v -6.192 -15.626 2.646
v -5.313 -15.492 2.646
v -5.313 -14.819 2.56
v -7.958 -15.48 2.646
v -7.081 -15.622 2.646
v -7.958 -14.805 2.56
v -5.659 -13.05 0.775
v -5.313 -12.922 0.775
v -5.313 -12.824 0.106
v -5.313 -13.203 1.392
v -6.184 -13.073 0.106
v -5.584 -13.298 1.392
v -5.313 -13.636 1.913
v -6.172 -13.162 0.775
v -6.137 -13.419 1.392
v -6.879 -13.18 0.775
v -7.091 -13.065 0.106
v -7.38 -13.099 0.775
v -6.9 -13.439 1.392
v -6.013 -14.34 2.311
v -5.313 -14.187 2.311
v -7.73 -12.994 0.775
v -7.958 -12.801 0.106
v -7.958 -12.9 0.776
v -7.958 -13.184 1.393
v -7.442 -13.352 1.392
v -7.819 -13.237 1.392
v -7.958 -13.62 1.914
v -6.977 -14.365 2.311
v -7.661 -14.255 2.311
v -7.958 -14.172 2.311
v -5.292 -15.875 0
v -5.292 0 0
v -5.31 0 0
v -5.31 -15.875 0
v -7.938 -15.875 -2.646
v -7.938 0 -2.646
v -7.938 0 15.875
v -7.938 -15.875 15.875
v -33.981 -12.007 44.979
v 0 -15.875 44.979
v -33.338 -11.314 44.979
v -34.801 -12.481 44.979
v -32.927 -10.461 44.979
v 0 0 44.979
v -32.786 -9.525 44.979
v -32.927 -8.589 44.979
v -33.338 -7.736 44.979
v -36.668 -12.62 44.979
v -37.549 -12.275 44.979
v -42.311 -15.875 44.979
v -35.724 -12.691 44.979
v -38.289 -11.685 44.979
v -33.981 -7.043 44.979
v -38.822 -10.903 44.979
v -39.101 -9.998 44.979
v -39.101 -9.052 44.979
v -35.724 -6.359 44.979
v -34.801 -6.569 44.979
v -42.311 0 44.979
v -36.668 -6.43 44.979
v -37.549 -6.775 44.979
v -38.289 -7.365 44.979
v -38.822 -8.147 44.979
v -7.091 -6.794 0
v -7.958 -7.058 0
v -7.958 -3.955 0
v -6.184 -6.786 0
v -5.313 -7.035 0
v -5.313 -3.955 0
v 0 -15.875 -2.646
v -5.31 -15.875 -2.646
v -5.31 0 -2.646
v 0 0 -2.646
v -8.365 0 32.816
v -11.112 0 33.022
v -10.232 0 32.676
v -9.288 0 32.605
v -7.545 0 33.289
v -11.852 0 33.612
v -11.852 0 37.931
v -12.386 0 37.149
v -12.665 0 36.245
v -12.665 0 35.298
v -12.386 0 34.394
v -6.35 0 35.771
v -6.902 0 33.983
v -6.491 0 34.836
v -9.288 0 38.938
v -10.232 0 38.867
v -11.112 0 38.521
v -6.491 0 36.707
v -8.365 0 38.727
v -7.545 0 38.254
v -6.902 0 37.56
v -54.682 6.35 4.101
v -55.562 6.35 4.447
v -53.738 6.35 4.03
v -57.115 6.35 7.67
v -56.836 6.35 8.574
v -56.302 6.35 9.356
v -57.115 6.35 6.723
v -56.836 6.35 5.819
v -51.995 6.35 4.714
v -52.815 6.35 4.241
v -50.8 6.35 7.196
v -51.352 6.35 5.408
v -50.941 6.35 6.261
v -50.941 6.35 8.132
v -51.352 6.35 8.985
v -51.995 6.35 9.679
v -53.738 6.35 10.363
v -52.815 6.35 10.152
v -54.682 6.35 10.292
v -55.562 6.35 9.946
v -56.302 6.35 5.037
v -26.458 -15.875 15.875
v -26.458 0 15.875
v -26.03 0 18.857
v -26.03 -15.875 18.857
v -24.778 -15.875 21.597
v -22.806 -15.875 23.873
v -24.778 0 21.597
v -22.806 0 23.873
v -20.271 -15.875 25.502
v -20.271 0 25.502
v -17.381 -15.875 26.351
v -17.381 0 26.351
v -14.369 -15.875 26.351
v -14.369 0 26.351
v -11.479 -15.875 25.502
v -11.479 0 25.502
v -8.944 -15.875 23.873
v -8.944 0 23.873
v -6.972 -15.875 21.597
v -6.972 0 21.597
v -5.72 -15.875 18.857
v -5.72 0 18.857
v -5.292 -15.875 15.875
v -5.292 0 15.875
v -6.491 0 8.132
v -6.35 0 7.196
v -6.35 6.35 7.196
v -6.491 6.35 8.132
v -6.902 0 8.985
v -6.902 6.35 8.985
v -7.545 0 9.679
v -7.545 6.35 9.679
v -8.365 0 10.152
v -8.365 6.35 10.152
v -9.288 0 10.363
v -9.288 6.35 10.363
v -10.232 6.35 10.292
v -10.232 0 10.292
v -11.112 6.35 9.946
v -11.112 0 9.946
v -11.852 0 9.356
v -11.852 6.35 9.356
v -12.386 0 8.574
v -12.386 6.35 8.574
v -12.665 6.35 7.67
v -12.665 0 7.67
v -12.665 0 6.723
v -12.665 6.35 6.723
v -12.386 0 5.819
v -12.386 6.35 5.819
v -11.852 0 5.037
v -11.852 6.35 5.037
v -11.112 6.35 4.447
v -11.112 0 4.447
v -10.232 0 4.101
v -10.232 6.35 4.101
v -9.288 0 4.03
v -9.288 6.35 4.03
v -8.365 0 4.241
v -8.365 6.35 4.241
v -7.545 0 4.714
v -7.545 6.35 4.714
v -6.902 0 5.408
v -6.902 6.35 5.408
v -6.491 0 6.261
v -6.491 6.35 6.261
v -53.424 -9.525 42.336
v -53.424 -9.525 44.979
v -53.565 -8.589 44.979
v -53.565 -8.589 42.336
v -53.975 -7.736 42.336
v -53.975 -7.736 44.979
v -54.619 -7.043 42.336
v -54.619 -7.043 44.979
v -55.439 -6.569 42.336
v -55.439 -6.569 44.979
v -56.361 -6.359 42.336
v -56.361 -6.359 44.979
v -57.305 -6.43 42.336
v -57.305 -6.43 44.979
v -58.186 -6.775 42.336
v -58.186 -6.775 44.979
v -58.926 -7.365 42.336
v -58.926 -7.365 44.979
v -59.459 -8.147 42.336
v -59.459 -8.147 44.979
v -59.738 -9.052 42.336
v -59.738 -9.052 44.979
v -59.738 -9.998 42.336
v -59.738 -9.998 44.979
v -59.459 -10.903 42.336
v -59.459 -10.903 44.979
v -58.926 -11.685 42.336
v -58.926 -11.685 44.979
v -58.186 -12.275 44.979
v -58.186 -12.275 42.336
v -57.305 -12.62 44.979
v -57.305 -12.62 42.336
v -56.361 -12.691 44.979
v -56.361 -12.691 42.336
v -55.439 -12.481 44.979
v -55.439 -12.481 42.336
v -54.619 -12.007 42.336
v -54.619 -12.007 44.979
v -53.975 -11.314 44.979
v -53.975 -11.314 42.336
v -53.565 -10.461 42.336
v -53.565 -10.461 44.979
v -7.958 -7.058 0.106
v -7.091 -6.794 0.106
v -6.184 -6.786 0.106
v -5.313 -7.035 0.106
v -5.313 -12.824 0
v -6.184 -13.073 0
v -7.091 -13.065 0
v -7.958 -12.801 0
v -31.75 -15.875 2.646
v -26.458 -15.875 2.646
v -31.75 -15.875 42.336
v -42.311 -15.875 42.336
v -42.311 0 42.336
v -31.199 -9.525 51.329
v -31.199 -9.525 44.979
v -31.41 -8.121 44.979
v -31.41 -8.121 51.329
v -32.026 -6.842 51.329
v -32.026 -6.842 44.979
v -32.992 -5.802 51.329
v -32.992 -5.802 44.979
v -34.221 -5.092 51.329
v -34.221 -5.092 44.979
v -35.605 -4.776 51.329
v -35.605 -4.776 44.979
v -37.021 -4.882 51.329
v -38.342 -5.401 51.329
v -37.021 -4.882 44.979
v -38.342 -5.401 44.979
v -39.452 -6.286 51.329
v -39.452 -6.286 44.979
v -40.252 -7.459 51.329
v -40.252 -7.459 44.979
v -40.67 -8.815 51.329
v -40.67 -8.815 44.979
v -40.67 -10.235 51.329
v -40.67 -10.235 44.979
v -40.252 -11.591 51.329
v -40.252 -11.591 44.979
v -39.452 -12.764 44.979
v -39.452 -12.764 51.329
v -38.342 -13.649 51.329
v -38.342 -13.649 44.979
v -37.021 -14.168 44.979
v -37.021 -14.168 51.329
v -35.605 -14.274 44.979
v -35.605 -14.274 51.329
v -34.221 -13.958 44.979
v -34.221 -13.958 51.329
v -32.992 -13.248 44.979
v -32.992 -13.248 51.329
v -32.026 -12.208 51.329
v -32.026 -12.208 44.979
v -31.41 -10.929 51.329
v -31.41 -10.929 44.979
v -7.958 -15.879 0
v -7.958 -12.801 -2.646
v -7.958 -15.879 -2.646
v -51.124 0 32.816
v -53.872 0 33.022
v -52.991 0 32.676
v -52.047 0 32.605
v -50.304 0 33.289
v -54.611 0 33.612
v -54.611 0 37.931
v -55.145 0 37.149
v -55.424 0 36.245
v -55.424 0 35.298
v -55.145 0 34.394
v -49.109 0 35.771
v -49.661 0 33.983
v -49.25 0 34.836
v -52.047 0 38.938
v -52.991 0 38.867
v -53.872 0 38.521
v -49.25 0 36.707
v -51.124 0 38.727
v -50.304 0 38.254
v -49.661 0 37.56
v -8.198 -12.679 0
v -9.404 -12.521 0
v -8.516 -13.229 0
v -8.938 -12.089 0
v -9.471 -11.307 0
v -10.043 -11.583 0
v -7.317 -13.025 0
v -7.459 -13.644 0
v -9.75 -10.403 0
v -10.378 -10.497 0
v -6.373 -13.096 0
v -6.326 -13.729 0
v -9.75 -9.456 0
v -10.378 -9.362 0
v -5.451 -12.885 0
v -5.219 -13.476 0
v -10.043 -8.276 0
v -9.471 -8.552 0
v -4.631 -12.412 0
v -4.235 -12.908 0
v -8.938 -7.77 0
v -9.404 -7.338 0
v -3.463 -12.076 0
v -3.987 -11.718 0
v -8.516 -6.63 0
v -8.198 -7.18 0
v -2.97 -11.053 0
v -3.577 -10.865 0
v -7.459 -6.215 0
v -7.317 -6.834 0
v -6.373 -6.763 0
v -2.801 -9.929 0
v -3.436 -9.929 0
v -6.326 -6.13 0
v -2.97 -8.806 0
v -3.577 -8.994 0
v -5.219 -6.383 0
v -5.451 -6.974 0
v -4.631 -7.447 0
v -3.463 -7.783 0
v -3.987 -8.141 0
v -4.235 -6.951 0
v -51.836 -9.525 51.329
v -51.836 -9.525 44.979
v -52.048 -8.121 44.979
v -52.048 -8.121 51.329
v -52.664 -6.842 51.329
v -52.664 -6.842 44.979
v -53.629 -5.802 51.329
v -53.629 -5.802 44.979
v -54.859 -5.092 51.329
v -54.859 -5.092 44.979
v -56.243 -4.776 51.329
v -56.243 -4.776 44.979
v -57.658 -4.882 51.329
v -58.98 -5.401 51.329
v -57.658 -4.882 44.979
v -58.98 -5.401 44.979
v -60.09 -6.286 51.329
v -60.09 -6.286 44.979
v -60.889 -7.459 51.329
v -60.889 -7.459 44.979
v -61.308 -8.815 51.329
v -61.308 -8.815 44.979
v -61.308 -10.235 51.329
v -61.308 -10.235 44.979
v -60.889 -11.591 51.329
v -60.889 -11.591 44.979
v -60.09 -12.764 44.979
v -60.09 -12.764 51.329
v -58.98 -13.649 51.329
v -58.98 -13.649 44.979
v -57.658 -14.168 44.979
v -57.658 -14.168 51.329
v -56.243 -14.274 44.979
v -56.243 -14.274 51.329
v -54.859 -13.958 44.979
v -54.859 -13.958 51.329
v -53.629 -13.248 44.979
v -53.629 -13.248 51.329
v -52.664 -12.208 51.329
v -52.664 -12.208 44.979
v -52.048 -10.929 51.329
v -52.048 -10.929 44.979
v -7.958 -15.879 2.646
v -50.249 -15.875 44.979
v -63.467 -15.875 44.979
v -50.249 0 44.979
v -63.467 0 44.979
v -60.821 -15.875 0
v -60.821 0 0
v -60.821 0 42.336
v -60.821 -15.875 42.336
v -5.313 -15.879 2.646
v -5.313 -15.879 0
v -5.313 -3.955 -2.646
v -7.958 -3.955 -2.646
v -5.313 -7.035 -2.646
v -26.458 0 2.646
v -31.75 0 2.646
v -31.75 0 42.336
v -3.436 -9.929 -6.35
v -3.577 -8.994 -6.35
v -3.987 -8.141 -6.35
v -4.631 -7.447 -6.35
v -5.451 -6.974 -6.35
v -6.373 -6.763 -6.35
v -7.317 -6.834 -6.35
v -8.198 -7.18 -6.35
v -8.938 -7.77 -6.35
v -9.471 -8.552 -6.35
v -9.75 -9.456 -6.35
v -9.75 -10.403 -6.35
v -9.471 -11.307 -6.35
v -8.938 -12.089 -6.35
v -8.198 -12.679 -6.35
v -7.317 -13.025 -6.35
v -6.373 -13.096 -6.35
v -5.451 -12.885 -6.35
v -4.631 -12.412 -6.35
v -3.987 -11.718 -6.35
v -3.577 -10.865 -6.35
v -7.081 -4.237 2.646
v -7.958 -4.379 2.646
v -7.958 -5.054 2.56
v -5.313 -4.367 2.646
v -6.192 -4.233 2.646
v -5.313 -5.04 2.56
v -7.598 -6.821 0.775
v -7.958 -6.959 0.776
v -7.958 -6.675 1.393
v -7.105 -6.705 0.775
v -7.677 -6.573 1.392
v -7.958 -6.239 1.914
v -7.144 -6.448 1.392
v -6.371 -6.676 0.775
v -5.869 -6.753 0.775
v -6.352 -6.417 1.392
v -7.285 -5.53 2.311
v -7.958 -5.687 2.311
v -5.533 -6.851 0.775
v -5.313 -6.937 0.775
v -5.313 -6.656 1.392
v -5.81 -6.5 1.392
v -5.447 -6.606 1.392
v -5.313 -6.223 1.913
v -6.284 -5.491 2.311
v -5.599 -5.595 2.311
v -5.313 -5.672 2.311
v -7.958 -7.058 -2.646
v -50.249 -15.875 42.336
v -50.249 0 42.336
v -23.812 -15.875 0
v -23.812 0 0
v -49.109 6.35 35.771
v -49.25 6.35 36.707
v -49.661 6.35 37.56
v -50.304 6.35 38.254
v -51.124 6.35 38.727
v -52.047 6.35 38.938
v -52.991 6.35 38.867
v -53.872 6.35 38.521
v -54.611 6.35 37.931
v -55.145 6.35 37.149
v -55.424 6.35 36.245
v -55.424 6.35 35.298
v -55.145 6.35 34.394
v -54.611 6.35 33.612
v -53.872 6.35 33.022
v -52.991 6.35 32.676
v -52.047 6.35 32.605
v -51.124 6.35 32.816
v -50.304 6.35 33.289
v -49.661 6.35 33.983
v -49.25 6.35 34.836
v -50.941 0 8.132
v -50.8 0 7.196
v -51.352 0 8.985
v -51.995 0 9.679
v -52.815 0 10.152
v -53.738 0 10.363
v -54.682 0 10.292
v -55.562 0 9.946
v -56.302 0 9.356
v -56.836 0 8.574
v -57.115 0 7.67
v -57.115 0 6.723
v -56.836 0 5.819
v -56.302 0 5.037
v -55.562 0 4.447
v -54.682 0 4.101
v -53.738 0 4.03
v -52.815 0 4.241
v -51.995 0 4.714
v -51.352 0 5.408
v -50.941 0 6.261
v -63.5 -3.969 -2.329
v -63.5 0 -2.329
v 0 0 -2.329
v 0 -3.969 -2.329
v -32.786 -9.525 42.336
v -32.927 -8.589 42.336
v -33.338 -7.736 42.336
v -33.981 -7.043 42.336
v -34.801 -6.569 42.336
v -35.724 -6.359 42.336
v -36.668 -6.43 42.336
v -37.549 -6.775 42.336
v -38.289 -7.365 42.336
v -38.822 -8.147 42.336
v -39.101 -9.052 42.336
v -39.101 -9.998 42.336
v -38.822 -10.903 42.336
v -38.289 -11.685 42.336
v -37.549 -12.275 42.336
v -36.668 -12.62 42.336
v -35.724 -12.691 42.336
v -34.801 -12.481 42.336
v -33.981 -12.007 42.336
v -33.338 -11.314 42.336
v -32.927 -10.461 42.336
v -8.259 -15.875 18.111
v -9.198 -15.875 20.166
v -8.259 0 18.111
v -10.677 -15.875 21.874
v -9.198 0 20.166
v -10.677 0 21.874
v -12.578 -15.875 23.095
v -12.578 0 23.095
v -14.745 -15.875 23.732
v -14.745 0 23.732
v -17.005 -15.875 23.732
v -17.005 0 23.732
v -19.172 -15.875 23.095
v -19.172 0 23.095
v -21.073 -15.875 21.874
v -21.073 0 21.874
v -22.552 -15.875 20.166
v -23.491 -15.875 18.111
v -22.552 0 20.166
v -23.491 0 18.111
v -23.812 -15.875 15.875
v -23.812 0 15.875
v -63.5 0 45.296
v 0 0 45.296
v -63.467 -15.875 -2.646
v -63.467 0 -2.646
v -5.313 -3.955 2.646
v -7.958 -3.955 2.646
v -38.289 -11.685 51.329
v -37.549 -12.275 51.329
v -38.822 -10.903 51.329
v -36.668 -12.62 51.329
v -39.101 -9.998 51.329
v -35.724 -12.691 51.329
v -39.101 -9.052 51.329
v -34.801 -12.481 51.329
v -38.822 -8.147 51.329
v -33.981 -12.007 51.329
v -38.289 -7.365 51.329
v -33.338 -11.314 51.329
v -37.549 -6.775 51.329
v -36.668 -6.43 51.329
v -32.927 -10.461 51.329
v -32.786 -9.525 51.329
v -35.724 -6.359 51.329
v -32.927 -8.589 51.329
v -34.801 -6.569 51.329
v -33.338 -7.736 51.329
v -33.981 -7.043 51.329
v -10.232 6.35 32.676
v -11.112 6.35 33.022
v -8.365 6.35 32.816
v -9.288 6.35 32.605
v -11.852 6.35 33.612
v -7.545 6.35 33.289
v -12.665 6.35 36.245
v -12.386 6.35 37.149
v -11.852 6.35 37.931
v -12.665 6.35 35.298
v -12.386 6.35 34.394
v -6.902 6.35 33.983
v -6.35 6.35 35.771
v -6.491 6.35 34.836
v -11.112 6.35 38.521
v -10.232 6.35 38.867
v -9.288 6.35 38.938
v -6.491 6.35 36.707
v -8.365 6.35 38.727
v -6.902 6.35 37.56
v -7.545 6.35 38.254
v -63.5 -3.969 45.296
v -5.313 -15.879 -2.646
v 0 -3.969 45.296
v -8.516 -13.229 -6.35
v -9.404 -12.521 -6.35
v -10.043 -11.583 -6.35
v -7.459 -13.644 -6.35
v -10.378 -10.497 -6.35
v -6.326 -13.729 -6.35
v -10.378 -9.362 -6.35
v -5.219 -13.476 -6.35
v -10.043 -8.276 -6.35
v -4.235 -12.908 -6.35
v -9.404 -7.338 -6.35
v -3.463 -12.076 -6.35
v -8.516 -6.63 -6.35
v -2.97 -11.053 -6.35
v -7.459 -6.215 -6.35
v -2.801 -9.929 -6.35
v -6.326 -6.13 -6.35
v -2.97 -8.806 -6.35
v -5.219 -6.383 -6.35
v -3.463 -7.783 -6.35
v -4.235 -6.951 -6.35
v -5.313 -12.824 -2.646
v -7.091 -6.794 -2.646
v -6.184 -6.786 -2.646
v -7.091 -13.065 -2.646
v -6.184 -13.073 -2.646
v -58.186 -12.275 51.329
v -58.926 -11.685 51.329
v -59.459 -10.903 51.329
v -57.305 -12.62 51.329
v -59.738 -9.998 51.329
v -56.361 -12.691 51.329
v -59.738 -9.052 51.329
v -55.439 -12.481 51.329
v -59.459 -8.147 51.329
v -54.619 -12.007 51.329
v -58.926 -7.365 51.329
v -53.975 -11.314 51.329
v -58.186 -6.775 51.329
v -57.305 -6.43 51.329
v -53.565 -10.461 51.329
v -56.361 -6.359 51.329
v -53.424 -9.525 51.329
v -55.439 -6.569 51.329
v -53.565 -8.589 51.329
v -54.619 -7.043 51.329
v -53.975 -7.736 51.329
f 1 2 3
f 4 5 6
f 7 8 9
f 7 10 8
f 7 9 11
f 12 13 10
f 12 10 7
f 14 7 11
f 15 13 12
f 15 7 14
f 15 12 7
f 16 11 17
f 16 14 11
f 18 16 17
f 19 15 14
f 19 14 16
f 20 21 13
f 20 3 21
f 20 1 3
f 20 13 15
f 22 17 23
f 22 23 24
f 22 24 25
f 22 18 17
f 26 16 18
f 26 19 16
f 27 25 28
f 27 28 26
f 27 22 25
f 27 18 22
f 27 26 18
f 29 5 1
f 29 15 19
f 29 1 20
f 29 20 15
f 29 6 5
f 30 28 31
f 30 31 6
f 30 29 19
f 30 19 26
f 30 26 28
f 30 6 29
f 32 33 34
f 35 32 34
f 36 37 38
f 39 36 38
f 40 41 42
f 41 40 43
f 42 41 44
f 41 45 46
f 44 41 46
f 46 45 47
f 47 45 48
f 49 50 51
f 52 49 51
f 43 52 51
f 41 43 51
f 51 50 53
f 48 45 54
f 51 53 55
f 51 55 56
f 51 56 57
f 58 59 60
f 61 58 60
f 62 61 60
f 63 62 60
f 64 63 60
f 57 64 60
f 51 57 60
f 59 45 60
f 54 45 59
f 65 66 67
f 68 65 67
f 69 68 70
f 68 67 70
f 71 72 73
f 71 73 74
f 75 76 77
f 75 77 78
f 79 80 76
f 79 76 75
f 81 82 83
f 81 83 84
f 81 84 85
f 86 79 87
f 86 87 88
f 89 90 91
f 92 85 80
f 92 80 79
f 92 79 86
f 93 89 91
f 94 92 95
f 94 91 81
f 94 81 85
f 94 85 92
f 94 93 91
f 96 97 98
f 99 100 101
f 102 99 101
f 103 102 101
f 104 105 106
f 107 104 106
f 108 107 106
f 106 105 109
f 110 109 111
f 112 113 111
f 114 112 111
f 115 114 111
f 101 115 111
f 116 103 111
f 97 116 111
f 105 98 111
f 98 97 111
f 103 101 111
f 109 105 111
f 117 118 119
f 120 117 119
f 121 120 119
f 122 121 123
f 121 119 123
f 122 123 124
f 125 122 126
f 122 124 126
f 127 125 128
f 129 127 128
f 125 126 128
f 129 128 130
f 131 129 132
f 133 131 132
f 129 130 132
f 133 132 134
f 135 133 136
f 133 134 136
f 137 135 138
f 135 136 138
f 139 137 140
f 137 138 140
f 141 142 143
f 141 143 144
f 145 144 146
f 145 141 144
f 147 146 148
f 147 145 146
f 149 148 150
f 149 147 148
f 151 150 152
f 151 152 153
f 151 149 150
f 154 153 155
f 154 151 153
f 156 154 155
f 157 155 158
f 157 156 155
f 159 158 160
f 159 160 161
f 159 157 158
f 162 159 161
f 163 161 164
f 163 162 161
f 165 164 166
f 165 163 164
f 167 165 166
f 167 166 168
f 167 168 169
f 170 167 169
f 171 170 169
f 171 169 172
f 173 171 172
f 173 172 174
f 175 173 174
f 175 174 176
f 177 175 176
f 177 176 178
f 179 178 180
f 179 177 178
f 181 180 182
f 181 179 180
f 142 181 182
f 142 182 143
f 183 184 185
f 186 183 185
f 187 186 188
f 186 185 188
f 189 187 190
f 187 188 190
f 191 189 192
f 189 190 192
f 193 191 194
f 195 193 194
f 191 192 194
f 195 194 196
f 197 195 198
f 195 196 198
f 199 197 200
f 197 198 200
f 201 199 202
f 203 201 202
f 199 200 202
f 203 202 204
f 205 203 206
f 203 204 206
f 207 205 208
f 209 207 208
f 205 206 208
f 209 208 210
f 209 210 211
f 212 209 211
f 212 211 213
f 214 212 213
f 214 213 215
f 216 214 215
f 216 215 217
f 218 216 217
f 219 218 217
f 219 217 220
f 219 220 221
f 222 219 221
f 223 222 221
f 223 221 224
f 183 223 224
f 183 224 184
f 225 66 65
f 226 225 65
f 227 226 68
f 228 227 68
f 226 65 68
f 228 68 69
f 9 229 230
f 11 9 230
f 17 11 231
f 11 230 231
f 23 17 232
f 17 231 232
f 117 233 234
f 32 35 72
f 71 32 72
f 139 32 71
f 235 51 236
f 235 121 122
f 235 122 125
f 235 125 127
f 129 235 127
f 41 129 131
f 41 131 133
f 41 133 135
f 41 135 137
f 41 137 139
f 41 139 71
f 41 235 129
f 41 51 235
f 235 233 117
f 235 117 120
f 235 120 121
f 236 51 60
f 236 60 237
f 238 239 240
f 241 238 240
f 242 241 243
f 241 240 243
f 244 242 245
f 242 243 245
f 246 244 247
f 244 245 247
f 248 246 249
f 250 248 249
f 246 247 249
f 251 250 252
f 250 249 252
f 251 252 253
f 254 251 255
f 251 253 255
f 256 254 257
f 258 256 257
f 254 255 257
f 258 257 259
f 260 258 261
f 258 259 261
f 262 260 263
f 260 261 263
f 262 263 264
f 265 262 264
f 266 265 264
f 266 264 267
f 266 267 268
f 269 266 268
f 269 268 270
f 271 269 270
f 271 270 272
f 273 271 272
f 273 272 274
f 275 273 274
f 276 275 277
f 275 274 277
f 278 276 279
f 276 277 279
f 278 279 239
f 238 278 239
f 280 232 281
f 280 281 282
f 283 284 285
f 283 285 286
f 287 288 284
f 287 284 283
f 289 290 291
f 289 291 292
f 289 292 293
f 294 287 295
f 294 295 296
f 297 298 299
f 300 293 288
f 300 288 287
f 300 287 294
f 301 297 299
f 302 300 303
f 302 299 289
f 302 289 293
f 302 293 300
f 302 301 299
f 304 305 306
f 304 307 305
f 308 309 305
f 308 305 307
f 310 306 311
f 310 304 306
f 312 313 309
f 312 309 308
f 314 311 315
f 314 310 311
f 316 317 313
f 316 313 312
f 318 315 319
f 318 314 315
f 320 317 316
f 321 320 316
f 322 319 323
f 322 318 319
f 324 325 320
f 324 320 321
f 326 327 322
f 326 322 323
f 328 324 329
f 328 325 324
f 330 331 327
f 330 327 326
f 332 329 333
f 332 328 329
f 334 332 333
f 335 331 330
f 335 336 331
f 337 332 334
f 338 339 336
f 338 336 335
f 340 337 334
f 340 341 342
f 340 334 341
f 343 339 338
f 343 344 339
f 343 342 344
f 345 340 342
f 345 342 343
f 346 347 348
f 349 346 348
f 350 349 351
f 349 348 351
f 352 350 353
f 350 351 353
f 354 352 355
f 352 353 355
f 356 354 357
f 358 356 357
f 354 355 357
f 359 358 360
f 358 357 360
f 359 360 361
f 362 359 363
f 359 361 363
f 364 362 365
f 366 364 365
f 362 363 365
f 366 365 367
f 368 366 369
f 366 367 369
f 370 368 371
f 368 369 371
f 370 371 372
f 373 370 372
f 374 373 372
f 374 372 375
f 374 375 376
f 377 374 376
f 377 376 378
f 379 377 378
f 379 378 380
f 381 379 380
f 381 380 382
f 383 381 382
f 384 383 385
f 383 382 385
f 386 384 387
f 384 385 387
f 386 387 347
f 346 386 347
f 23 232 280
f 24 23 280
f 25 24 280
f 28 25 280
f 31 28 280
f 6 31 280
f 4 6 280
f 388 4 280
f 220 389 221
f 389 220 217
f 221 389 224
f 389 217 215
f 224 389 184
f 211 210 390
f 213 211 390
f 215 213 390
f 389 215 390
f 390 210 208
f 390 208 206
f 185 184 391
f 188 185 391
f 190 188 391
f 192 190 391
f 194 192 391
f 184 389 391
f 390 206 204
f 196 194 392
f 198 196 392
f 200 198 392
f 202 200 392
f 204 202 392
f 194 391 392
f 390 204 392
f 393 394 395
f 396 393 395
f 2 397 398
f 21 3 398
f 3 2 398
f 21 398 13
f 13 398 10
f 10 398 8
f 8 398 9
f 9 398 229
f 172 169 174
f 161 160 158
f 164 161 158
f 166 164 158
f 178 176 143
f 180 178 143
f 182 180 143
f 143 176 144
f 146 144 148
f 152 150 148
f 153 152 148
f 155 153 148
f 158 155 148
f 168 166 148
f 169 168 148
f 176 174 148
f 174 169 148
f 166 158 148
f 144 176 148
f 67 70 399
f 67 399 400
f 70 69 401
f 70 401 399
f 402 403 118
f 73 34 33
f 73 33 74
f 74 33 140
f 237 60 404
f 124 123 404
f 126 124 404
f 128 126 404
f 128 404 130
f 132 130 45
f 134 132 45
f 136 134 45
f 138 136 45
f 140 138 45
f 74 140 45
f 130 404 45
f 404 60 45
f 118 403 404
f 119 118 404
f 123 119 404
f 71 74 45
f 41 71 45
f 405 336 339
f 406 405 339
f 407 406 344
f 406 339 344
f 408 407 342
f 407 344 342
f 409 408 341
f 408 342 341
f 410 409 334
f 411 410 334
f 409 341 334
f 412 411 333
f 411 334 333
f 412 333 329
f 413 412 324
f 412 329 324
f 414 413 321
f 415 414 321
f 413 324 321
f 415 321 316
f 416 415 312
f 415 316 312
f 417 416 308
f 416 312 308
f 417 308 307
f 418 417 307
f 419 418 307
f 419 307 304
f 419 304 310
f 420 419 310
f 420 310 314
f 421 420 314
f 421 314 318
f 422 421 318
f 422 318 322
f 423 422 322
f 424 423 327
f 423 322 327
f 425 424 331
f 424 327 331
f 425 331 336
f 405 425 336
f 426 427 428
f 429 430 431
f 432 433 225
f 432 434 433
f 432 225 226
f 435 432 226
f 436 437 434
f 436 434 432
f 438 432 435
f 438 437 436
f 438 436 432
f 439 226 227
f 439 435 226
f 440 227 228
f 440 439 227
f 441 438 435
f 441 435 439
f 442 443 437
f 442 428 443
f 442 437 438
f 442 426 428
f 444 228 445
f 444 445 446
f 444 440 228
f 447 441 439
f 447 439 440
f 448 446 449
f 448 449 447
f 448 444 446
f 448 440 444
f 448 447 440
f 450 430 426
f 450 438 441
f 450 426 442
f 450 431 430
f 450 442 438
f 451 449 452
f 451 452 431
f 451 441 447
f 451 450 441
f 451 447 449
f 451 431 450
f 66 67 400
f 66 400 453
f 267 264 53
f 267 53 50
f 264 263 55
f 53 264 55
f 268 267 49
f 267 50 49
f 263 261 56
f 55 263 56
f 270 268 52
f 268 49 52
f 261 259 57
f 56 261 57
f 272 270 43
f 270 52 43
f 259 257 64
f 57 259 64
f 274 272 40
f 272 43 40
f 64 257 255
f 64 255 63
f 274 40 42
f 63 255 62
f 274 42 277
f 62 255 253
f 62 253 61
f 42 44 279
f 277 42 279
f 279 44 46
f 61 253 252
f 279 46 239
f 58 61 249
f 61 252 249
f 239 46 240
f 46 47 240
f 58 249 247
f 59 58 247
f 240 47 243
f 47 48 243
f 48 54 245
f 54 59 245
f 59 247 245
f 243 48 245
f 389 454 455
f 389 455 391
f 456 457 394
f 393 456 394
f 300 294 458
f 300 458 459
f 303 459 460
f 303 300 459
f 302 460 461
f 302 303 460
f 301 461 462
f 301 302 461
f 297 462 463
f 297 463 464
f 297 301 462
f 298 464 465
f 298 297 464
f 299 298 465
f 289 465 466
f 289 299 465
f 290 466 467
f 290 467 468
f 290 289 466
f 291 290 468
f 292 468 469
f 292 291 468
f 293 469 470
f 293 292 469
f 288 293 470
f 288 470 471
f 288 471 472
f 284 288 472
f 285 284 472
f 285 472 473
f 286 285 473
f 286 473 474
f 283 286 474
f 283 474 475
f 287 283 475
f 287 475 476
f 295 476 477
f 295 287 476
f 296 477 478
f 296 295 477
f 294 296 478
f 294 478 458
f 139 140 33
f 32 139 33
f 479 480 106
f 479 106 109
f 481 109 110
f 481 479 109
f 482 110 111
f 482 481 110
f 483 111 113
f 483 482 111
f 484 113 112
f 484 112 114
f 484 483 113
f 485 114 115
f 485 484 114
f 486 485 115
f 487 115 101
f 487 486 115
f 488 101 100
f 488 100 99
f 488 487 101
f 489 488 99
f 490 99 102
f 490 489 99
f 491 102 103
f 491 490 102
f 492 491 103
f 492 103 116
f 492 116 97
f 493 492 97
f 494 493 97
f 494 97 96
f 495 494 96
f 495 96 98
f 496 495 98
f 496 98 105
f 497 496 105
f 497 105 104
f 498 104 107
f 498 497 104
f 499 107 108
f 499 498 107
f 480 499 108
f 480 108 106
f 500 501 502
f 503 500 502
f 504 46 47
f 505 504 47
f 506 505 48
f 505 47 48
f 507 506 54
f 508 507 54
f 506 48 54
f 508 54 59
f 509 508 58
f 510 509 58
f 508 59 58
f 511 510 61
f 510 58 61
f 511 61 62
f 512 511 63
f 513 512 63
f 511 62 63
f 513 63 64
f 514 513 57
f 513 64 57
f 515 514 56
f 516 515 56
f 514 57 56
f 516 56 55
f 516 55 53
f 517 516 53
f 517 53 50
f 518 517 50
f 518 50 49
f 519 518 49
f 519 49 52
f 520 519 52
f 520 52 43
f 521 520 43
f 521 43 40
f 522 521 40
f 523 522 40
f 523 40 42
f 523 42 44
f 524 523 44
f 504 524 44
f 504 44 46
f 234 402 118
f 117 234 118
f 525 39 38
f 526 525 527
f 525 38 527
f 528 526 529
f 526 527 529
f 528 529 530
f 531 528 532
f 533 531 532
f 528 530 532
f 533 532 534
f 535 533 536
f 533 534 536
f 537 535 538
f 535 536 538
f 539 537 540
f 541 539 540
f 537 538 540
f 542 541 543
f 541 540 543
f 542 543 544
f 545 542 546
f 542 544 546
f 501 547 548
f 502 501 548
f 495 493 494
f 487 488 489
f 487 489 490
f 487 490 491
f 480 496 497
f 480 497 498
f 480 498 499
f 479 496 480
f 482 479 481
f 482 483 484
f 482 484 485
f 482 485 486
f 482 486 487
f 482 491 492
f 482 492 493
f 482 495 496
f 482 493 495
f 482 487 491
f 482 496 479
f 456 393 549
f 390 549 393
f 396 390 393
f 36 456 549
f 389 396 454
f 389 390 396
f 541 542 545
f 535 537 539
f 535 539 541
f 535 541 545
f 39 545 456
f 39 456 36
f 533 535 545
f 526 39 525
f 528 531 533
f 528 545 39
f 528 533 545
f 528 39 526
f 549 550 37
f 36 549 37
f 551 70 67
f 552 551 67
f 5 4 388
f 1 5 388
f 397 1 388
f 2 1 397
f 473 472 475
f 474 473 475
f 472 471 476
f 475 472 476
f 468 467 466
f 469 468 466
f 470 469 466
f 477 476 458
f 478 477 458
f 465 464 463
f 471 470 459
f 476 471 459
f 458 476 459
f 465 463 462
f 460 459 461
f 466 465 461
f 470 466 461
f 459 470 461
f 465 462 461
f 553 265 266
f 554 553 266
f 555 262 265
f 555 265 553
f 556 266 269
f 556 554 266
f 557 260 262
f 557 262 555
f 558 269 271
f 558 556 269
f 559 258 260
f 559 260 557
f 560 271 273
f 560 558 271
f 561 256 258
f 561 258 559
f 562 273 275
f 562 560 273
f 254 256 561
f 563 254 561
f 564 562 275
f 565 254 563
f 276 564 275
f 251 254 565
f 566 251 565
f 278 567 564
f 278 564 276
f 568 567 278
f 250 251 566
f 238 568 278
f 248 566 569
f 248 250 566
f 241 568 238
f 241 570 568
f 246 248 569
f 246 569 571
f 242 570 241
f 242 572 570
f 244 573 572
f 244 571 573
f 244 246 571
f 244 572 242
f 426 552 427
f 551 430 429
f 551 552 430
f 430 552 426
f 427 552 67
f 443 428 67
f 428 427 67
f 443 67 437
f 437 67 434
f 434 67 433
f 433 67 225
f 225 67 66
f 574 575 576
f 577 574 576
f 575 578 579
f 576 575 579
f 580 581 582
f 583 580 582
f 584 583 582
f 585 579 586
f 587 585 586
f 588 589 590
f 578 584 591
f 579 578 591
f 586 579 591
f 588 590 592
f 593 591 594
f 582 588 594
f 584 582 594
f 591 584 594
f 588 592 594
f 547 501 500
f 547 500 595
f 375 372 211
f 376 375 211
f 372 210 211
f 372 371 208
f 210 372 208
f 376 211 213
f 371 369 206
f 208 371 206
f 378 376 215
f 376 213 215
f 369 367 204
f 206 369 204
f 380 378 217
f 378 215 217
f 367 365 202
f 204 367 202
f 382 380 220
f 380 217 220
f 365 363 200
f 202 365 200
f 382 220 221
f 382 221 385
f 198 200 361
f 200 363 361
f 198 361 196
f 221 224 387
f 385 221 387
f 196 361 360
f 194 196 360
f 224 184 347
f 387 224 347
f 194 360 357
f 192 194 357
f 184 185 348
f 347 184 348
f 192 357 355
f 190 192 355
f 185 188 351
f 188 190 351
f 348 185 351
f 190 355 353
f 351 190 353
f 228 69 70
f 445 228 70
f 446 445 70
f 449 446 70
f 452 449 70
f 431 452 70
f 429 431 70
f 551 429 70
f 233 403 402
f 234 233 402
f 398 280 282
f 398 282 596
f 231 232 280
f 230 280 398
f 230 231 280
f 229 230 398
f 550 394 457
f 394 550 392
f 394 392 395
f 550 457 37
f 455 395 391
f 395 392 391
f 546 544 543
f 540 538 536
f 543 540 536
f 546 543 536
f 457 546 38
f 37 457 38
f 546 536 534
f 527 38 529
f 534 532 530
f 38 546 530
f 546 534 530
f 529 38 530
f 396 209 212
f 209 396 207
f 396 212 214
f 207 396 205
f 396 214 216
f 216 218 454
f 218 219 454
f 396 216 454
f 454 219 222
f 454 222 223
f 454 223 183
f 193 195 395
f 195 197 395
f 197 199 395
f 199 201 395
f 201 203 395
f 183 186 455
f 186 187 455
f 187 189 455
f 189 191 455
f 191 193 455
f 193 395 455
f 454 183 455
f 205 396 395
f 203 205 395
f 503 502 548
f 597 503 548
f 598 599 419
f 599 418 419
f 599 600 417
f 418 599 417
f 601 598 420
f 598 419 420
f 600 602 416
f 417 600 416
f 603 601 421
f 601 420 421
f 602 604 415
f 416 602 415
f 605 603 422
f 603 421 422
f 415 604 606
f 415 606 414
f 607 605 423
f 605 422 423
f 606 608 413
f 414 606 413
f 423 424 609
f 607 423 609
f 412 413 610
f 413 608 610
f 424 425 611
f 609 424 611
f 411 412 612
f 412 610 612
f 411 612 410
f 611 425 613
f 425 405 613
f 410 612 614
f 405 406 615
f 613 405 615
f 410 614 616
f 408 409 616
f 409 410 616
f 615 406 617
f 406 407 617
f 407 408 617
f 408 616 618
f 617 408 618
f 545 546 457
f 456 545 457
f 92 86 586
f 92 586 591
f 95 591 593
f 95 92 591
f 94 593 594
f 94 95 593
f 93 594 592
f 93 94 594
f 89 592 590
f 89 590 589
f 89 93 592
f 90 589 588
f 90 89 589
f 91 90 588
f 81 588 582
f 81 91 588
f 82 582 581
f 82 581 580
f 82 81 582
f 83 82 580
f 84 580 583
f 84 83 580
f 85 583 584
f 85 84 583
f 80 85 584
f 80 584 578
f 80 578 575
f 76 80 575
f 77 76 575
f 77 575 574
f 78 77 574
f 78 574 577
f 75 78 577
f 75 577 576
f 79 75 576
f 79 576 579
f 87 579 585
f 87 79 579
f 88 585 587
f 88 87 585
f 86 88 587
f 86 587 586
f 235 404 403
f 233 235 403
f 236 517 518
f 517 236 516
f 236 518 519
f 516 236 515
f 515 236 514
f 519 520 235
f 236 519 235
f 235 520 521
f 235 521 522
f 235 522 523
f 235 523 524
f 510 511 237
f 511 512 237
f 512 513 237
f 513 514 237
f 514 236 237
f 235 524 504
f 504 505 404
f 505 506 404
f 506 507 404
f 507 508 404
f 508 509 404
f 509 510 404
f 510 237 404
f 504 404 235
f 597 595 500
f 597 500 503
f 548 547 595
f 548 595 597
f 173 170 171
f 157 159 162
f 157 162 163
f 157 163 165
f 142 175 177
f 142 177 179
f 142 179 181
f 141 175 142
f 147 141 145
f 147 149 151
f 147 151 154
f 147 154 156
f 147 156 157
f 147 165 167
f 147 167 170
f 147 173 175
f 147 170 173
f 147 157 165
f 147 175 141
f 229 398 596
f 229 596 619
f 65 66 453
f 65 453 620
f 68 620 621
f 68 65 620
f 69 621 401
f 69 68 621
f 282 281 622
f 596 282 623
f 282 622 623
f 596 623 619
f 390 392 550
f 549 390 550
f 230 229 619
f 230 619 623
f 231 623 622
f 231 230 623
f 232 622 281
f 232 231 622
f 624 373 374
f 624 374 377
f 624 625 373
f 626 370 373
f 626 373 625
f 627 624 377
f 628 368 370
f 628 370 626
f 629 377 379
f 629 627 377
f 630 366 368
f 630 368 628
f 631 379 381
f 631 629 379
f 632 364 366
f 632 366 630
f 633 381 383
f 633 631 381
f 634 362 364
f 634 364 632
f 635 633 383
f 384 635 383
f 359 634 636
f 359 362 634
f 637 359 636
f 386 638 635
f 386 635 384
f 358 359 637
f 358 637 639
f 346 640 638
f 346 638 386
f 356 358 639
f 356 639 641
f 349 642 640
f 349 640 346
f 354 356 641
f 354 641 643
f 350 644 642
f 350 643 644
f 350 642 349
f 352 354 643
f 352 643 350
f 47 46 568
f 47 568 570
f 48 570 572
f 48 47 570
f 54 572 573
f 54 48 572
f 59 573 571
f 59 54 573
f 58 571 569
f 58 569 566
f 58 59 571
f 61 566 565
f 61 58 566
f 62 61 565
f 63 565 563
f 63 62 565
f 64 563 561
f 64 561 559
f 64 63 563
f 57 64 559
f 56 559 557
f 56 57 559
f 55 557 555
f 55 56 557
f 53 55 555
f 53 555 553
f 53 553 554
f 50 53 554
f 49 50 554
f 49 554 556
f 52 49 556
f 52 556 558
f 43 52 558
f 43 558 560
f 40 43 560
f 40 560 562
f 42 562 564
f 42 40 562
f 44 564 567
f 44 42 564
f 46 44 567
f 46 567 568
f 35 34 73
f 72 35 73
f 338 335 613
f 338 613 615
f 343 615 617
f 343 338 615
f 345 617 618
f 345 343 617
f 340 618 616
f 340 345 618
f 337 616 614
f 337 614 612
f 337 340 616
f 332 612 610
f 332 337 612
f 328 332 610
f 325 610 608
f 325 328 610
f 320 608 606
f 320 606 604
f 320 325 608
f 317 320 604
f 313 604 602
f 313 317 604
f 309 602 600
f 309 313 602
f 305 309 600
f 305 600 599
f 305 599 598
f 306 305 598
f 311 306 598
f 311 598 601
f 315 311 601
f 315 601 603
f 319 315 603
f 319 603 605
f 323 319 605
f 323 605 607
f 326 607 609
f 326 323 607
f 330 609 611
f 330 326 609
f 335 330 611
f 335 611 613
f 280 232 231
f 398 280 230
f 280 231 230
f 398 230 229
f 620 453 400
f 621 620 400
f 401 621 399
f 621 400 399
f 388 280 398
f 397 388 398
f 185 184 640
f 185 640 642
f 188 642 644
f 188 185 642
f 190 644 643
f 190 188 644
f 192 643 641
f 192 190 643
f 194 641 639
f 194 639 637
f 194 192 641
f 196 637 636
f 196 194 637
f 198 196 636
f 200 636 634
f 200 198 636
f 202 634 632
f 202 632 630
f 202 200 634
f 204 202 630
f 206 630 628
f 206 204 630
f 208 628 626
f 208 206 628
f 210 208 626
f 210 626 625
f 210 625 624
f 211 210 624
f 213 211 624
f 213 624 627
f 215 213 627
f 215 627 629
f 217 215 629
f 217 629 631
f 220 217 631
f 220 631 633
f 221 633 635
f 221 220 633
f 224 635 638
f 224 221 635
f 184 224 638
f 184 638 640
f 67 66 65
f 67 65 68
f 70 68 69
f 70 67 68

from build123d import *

# Parameters (mm, degrees)
F1_DEPTH  = 15.875
F0_W      = 2.6458333332
F0_H      = 42.3358732487
F2_W      = 63.5
F2_H      = 47.625
F2_R      = 3.175
F3_DEPTH  = 3.96875
F4_DEPTH  = 6.35
F5_R      = 4.7625
F5_R_2    = 3.175
F6_DEPTH  = 6.35
F7_R      = 3.175
F8_DEPTH  = 25.4
F9_R      = 3.81
F9_R_2    = 3.175
F10_DEPTH = 6.35
F12_DEPTH = 2.645833164
F13_DEPTH = 2.6458333316
F14_R     = 2.54
F14_2_R   = 2.54


# Not quite as in the source:
# - a feature names something its author has since deleted; it is built from what else it names


with BuildPart() as f1:
    # F0 (on Front) → F1 (new body)
    with BuildSketch(Plane.XZ):
        with BuildLine():
            Line((0, 44.979166582), (-31.75, 44.979166582))
            Line((-31.75, 44.979166582), (-31.75, 42.3358732487))
            Line((-31.75, 42.3358732487), (-31.75, 2.6458333332))
            Line((-31.75, 2.6458333332), (-26.4583333333, 2.6458333332))
            Line((-26.4583333333, 2.6458333332), (-26.4583333333, 15.875))
            ThreePointArc((-26.4583333333, 15.875), (-15.875, 26.4583333333), (-5.2916666667, 15.875))
            Line((-5.2916666667, 15.875), (-5.2916666667, 0))
            Line((-5.2916666667, 0), (0, 0))
            Line((0, 0), (0, 44.979166582))
        make_face()
        Polygon((0, -2.6458333333), (0, 0), (-5.2916666667, 0), (-5.309548229, 0), (-5.309548229, -2.6458333333), align=None)
        Polygon((-31.75, 42.3358732487), (-31.75, 44.979166582), (-34.3958333316, 44.979166582), (-37.0416664956, 44.979166582), (-42.3110765377, 44.979166582), (-42.3110765377, 42.3358732487), (-37.0416664956, 42.3358732487), (-34.3958333316, 42.3358732487), align=None)
    extrude(amount=F1_DEPTH)


with BuildPart() as f1b:
    # F0 (on Front) → F1, piece 2 (new body)
    with BuildSketch(Plane.XZ):
        with BuildLine():
            Line((-23.8125, 0), (-7.9375, 0))
            Line((-7.9375, 0), (-7.9375, 15.875))
            ThreePointArc((-7.9375, 15.875), (-15.875, 23.8125), (-23.8125, 15.875))
            Line((-23.8125, 15.875), (-23.8125, 0))
        make_face()
        Polygon((-26.4583333333, 0), (-31.75, 0), (-60.8213265341, 0), (-63.4671598673, 0), (-63.4671598673, -2.6458333333), (-7.9375, -2.6458333333), (-7.9375, 0), (-23.8125, 0), align=None)
        with Locations((-62.1442432007, 21.1679366243)):
            Rectangle(F0_W, F0_H)
        Polygon((-50.2485765377, 42.3358732487), (-50.2485765377, 44.979166582), (-55.5296598693, 44.979166582), (-58.175493201, 44.979166582), (-63.4671598673, 44.979166582), (-63.4671598673, 42.3358732487), (-60.8213265341, 42.3358732487), (-58.175493201, 42.3358732487), (-55.5296598693, 42.3358732487), align=None)
    extrude(amount=F1_DEPTH)


with BuildPart() as f3:
    # F2 (on Front) → F3 (new body)
    with BuildSketch(Plane.XZ):
        with Locations((-31.75, 21.4839725468)):
            Rectangle(F2_W, F2_H)
        with Locations((-53.975, 7.1964725468)):
            Circle(F2_R, mode=Mode.SUBTRACT)
        with Locations((-9.525, 7.1964725468)):
            Circle(F2_R, mode=Mode.SUBTRACT)
        with Locations((-52.284011212, 35.7714725468)):
            Circle(F2_R, mode=Mode.SUBTRACT)
        with Locations((-9.525, 35.7714725468)):
            Circle(F2_R, mode=Mode.SUBTRACT)
        with Locations((-52.284011212, 35.7714725468)):
            Circle(F2_R)
        with Locations((-53.975, 7.1964725468)):
            Circle(F2_R)
        with Locations((-9.525, 7.1964725468)):
            Circle(F2_R)
        with Locations((-9.525, 35.7714725468)):
            Circle(F2_R)
    extrude(amount=F3_DEPTH)


with BuildPart() as f4:
    # F2 (on Front) → F4 (new body)
    with BuildSketch(Plane.XZ):
        with Locations((-9.525, 35.7714725468)):
            Circle(F2_R)
    extrude(amount=-F4_DEPTH)


with BuildPart() as f4b:
    # F2 (on Front) → F4, piece 2 (new body)
    with BuildSketch(Plane.XZ):
        with Locations((-52.284011212, 35.7714725468)):
            Circle(F2_R)
    extrude(amount=-F4_DEPTH)


with BuildPart() as f4c:
    # F2 (on Front) → F4, piece 3 (new body)
    with BuildSketch(Plane.XZ):
        with Locations((-9.525, 7.1964725468)):
            Circle(F2_R)
    extrude(amount=-F4_DEPTH)


with BuildPart() as f4d:
    # F2 (on Front) → F4, piece 4 (new body)
    with BuildSketch(Plane.XZ):
        with Locations((-53.975, 7.1964725468)):
            Circle(F2_R)
    extrude(amount=-F4_DEPTH)


with BuildPart() as f6:
    # F5 (on face) → F6 (new body)
    with BuildSketch(Plane.XY.offset(44.979166582)):
        with Locations((-56.5985765377, -9.525)):
            Circle(F5_R)
        with Locations((-56.5985765377, -9.525)):
            Circle(F5_R_2, mode=Mode.SUBTRACT)
    extrude(amount=F6_DEPTH)


with BuildPart() as f6b:
    # F5 (on face) → F6, piece 2 (new body)
    with BuildSketch(Plane.XY.offset(44.979166582)):
        with Locations((-35.9610765377, -9.525)):
            Circle(F5_R)
        with Locations((-35.9610765377, -9.525)):
            Circle(F5_R_2, mode=Mode.SUBTRACT)
    extrude(amount=F6_DEPTH)


with BuildPart() as f8_tool:
    # F7 (on face) → F8 (new body)
    with BuildSketch(Plane.XY.offset(44.979166582)):
        with Locations((-35.9610765377, -9.525)):
            Circle(F7_R)
        with Locations((-56.5985765377, -9.525)):
            Circle(F7_R)
    extrude(amount=-F8_DEPTH)


with BuildPart() as f1_1:
    add(f1.part)

    # F8: cut by f8_tool
    add(f8_tool.part, mode=Mode.SUBTRACT)


with BuildPart() as f1b_1:
    add(f1b.part)

    # F8: cut by f8_tool
    add(f8_tool.part, mode=Mode.SUBTRACT)


with BuildPart() as f10:
    # F9 (on Top) → F10 (new body)
    with BuildSketch(Plane.XY):
        with Locations((-6.6107190214, -9.929494001)):
            Circle(F9_R)
        with Locations((-6.6107190214, -9.929494001)):
            Circle(F9_R_2, mode=Mode.SUBTRACT)
    extrude(amount=-F10_DEPTH)


with BuildPart() as f12:
    # F11 (on Top) → F12 (new body)
    with BuildSketch(Plane.XY):
        with BuildLine():
            Line((-7.958422415, -12.8011434192), (-7.958422415, -15.8794317394))
            Line((-7.958422415, -15.8794317394), (-5.3125890833, -15.8794317394))
            Line((-5.3125890833, -15.8794317394), (-5.3125890833, -12.8238909126))
            ThreePointArc((-5.3125890833, -12.8238909126), (-6.6379906914, -13.1015487096), (-7.958422415, -12.8011434192))
        make_face()
    extrude(amount=F12_DEPTH)


with BuildPart() as f12b:
    # F11 (on Top) → F12, piece 2 (new body)
    with BuildSketch(Plane.XY):
        with BuildLine():
            Line((-7.958422415, -3.9545679465), (-7.958422415, -7.0578445827))
            ThreePointArc((-7.958422415, -7.0578445827), (-6.6379906914, -6.7574392924), (-5.3125890833, -7.0350970893))
            Line((-5.3125890833, -7.0350970893), (-5.3125890833, -3.9545679465))
            Line((-5.3125890833, -3.9545679465), (-7.958422415, -3.9545679465))
        make_face()
    extrude(amount=F12_DEPTH)


with BuildPart() as f13:
    # F13 (new): a face of the model
    f13_faces = [f12.part.faces().sort_by_distance(p)[0] for p in [
        (-6.6371842751, -14.4419575778, 0),
    ]]
    extrude(f13_faces, amount=F13_DEPTH)


with BuildPart() as f13b:
    # F13#2 (new): a face of the model
    f13_2_faces = [f12b.part.faces().sort_by_distance(p)[0] for p in [
        (-6.6371697987, -5.4045252139, 0),
    ]]
    extrude(f13_2_faces, amount=F13_DEPTH)


with BuildPart() as f12b_1:
    add(f12b.part)

    # F14
    f14_edges = [f12b_1.edges().sort_by_distance(p)[0] for p in [
        (-6.637991, -6.757439, 2.645833),
    ]]
    fillet(f14_edges, radius=F14_R)


with BuildPart() as f12_1:
    add(f12.part)

    # F14#2
    f14_2_edges = [f12_1.edges().sort_by_distance(p)[0] for p in [
        (-6.637991, -13.101549, 2.645833),
    ]]
    fillet(f14_2_edges, radius=F14_2_R)


solid = Compound([f3.part, f4.part, f4b.part, f4c.part, f4d.part, f6.part, f6b.part, f1_1.part, f1b_1.part, f10.part, f13.part, f13b.part, f12b_1.part, f12_1.part])
